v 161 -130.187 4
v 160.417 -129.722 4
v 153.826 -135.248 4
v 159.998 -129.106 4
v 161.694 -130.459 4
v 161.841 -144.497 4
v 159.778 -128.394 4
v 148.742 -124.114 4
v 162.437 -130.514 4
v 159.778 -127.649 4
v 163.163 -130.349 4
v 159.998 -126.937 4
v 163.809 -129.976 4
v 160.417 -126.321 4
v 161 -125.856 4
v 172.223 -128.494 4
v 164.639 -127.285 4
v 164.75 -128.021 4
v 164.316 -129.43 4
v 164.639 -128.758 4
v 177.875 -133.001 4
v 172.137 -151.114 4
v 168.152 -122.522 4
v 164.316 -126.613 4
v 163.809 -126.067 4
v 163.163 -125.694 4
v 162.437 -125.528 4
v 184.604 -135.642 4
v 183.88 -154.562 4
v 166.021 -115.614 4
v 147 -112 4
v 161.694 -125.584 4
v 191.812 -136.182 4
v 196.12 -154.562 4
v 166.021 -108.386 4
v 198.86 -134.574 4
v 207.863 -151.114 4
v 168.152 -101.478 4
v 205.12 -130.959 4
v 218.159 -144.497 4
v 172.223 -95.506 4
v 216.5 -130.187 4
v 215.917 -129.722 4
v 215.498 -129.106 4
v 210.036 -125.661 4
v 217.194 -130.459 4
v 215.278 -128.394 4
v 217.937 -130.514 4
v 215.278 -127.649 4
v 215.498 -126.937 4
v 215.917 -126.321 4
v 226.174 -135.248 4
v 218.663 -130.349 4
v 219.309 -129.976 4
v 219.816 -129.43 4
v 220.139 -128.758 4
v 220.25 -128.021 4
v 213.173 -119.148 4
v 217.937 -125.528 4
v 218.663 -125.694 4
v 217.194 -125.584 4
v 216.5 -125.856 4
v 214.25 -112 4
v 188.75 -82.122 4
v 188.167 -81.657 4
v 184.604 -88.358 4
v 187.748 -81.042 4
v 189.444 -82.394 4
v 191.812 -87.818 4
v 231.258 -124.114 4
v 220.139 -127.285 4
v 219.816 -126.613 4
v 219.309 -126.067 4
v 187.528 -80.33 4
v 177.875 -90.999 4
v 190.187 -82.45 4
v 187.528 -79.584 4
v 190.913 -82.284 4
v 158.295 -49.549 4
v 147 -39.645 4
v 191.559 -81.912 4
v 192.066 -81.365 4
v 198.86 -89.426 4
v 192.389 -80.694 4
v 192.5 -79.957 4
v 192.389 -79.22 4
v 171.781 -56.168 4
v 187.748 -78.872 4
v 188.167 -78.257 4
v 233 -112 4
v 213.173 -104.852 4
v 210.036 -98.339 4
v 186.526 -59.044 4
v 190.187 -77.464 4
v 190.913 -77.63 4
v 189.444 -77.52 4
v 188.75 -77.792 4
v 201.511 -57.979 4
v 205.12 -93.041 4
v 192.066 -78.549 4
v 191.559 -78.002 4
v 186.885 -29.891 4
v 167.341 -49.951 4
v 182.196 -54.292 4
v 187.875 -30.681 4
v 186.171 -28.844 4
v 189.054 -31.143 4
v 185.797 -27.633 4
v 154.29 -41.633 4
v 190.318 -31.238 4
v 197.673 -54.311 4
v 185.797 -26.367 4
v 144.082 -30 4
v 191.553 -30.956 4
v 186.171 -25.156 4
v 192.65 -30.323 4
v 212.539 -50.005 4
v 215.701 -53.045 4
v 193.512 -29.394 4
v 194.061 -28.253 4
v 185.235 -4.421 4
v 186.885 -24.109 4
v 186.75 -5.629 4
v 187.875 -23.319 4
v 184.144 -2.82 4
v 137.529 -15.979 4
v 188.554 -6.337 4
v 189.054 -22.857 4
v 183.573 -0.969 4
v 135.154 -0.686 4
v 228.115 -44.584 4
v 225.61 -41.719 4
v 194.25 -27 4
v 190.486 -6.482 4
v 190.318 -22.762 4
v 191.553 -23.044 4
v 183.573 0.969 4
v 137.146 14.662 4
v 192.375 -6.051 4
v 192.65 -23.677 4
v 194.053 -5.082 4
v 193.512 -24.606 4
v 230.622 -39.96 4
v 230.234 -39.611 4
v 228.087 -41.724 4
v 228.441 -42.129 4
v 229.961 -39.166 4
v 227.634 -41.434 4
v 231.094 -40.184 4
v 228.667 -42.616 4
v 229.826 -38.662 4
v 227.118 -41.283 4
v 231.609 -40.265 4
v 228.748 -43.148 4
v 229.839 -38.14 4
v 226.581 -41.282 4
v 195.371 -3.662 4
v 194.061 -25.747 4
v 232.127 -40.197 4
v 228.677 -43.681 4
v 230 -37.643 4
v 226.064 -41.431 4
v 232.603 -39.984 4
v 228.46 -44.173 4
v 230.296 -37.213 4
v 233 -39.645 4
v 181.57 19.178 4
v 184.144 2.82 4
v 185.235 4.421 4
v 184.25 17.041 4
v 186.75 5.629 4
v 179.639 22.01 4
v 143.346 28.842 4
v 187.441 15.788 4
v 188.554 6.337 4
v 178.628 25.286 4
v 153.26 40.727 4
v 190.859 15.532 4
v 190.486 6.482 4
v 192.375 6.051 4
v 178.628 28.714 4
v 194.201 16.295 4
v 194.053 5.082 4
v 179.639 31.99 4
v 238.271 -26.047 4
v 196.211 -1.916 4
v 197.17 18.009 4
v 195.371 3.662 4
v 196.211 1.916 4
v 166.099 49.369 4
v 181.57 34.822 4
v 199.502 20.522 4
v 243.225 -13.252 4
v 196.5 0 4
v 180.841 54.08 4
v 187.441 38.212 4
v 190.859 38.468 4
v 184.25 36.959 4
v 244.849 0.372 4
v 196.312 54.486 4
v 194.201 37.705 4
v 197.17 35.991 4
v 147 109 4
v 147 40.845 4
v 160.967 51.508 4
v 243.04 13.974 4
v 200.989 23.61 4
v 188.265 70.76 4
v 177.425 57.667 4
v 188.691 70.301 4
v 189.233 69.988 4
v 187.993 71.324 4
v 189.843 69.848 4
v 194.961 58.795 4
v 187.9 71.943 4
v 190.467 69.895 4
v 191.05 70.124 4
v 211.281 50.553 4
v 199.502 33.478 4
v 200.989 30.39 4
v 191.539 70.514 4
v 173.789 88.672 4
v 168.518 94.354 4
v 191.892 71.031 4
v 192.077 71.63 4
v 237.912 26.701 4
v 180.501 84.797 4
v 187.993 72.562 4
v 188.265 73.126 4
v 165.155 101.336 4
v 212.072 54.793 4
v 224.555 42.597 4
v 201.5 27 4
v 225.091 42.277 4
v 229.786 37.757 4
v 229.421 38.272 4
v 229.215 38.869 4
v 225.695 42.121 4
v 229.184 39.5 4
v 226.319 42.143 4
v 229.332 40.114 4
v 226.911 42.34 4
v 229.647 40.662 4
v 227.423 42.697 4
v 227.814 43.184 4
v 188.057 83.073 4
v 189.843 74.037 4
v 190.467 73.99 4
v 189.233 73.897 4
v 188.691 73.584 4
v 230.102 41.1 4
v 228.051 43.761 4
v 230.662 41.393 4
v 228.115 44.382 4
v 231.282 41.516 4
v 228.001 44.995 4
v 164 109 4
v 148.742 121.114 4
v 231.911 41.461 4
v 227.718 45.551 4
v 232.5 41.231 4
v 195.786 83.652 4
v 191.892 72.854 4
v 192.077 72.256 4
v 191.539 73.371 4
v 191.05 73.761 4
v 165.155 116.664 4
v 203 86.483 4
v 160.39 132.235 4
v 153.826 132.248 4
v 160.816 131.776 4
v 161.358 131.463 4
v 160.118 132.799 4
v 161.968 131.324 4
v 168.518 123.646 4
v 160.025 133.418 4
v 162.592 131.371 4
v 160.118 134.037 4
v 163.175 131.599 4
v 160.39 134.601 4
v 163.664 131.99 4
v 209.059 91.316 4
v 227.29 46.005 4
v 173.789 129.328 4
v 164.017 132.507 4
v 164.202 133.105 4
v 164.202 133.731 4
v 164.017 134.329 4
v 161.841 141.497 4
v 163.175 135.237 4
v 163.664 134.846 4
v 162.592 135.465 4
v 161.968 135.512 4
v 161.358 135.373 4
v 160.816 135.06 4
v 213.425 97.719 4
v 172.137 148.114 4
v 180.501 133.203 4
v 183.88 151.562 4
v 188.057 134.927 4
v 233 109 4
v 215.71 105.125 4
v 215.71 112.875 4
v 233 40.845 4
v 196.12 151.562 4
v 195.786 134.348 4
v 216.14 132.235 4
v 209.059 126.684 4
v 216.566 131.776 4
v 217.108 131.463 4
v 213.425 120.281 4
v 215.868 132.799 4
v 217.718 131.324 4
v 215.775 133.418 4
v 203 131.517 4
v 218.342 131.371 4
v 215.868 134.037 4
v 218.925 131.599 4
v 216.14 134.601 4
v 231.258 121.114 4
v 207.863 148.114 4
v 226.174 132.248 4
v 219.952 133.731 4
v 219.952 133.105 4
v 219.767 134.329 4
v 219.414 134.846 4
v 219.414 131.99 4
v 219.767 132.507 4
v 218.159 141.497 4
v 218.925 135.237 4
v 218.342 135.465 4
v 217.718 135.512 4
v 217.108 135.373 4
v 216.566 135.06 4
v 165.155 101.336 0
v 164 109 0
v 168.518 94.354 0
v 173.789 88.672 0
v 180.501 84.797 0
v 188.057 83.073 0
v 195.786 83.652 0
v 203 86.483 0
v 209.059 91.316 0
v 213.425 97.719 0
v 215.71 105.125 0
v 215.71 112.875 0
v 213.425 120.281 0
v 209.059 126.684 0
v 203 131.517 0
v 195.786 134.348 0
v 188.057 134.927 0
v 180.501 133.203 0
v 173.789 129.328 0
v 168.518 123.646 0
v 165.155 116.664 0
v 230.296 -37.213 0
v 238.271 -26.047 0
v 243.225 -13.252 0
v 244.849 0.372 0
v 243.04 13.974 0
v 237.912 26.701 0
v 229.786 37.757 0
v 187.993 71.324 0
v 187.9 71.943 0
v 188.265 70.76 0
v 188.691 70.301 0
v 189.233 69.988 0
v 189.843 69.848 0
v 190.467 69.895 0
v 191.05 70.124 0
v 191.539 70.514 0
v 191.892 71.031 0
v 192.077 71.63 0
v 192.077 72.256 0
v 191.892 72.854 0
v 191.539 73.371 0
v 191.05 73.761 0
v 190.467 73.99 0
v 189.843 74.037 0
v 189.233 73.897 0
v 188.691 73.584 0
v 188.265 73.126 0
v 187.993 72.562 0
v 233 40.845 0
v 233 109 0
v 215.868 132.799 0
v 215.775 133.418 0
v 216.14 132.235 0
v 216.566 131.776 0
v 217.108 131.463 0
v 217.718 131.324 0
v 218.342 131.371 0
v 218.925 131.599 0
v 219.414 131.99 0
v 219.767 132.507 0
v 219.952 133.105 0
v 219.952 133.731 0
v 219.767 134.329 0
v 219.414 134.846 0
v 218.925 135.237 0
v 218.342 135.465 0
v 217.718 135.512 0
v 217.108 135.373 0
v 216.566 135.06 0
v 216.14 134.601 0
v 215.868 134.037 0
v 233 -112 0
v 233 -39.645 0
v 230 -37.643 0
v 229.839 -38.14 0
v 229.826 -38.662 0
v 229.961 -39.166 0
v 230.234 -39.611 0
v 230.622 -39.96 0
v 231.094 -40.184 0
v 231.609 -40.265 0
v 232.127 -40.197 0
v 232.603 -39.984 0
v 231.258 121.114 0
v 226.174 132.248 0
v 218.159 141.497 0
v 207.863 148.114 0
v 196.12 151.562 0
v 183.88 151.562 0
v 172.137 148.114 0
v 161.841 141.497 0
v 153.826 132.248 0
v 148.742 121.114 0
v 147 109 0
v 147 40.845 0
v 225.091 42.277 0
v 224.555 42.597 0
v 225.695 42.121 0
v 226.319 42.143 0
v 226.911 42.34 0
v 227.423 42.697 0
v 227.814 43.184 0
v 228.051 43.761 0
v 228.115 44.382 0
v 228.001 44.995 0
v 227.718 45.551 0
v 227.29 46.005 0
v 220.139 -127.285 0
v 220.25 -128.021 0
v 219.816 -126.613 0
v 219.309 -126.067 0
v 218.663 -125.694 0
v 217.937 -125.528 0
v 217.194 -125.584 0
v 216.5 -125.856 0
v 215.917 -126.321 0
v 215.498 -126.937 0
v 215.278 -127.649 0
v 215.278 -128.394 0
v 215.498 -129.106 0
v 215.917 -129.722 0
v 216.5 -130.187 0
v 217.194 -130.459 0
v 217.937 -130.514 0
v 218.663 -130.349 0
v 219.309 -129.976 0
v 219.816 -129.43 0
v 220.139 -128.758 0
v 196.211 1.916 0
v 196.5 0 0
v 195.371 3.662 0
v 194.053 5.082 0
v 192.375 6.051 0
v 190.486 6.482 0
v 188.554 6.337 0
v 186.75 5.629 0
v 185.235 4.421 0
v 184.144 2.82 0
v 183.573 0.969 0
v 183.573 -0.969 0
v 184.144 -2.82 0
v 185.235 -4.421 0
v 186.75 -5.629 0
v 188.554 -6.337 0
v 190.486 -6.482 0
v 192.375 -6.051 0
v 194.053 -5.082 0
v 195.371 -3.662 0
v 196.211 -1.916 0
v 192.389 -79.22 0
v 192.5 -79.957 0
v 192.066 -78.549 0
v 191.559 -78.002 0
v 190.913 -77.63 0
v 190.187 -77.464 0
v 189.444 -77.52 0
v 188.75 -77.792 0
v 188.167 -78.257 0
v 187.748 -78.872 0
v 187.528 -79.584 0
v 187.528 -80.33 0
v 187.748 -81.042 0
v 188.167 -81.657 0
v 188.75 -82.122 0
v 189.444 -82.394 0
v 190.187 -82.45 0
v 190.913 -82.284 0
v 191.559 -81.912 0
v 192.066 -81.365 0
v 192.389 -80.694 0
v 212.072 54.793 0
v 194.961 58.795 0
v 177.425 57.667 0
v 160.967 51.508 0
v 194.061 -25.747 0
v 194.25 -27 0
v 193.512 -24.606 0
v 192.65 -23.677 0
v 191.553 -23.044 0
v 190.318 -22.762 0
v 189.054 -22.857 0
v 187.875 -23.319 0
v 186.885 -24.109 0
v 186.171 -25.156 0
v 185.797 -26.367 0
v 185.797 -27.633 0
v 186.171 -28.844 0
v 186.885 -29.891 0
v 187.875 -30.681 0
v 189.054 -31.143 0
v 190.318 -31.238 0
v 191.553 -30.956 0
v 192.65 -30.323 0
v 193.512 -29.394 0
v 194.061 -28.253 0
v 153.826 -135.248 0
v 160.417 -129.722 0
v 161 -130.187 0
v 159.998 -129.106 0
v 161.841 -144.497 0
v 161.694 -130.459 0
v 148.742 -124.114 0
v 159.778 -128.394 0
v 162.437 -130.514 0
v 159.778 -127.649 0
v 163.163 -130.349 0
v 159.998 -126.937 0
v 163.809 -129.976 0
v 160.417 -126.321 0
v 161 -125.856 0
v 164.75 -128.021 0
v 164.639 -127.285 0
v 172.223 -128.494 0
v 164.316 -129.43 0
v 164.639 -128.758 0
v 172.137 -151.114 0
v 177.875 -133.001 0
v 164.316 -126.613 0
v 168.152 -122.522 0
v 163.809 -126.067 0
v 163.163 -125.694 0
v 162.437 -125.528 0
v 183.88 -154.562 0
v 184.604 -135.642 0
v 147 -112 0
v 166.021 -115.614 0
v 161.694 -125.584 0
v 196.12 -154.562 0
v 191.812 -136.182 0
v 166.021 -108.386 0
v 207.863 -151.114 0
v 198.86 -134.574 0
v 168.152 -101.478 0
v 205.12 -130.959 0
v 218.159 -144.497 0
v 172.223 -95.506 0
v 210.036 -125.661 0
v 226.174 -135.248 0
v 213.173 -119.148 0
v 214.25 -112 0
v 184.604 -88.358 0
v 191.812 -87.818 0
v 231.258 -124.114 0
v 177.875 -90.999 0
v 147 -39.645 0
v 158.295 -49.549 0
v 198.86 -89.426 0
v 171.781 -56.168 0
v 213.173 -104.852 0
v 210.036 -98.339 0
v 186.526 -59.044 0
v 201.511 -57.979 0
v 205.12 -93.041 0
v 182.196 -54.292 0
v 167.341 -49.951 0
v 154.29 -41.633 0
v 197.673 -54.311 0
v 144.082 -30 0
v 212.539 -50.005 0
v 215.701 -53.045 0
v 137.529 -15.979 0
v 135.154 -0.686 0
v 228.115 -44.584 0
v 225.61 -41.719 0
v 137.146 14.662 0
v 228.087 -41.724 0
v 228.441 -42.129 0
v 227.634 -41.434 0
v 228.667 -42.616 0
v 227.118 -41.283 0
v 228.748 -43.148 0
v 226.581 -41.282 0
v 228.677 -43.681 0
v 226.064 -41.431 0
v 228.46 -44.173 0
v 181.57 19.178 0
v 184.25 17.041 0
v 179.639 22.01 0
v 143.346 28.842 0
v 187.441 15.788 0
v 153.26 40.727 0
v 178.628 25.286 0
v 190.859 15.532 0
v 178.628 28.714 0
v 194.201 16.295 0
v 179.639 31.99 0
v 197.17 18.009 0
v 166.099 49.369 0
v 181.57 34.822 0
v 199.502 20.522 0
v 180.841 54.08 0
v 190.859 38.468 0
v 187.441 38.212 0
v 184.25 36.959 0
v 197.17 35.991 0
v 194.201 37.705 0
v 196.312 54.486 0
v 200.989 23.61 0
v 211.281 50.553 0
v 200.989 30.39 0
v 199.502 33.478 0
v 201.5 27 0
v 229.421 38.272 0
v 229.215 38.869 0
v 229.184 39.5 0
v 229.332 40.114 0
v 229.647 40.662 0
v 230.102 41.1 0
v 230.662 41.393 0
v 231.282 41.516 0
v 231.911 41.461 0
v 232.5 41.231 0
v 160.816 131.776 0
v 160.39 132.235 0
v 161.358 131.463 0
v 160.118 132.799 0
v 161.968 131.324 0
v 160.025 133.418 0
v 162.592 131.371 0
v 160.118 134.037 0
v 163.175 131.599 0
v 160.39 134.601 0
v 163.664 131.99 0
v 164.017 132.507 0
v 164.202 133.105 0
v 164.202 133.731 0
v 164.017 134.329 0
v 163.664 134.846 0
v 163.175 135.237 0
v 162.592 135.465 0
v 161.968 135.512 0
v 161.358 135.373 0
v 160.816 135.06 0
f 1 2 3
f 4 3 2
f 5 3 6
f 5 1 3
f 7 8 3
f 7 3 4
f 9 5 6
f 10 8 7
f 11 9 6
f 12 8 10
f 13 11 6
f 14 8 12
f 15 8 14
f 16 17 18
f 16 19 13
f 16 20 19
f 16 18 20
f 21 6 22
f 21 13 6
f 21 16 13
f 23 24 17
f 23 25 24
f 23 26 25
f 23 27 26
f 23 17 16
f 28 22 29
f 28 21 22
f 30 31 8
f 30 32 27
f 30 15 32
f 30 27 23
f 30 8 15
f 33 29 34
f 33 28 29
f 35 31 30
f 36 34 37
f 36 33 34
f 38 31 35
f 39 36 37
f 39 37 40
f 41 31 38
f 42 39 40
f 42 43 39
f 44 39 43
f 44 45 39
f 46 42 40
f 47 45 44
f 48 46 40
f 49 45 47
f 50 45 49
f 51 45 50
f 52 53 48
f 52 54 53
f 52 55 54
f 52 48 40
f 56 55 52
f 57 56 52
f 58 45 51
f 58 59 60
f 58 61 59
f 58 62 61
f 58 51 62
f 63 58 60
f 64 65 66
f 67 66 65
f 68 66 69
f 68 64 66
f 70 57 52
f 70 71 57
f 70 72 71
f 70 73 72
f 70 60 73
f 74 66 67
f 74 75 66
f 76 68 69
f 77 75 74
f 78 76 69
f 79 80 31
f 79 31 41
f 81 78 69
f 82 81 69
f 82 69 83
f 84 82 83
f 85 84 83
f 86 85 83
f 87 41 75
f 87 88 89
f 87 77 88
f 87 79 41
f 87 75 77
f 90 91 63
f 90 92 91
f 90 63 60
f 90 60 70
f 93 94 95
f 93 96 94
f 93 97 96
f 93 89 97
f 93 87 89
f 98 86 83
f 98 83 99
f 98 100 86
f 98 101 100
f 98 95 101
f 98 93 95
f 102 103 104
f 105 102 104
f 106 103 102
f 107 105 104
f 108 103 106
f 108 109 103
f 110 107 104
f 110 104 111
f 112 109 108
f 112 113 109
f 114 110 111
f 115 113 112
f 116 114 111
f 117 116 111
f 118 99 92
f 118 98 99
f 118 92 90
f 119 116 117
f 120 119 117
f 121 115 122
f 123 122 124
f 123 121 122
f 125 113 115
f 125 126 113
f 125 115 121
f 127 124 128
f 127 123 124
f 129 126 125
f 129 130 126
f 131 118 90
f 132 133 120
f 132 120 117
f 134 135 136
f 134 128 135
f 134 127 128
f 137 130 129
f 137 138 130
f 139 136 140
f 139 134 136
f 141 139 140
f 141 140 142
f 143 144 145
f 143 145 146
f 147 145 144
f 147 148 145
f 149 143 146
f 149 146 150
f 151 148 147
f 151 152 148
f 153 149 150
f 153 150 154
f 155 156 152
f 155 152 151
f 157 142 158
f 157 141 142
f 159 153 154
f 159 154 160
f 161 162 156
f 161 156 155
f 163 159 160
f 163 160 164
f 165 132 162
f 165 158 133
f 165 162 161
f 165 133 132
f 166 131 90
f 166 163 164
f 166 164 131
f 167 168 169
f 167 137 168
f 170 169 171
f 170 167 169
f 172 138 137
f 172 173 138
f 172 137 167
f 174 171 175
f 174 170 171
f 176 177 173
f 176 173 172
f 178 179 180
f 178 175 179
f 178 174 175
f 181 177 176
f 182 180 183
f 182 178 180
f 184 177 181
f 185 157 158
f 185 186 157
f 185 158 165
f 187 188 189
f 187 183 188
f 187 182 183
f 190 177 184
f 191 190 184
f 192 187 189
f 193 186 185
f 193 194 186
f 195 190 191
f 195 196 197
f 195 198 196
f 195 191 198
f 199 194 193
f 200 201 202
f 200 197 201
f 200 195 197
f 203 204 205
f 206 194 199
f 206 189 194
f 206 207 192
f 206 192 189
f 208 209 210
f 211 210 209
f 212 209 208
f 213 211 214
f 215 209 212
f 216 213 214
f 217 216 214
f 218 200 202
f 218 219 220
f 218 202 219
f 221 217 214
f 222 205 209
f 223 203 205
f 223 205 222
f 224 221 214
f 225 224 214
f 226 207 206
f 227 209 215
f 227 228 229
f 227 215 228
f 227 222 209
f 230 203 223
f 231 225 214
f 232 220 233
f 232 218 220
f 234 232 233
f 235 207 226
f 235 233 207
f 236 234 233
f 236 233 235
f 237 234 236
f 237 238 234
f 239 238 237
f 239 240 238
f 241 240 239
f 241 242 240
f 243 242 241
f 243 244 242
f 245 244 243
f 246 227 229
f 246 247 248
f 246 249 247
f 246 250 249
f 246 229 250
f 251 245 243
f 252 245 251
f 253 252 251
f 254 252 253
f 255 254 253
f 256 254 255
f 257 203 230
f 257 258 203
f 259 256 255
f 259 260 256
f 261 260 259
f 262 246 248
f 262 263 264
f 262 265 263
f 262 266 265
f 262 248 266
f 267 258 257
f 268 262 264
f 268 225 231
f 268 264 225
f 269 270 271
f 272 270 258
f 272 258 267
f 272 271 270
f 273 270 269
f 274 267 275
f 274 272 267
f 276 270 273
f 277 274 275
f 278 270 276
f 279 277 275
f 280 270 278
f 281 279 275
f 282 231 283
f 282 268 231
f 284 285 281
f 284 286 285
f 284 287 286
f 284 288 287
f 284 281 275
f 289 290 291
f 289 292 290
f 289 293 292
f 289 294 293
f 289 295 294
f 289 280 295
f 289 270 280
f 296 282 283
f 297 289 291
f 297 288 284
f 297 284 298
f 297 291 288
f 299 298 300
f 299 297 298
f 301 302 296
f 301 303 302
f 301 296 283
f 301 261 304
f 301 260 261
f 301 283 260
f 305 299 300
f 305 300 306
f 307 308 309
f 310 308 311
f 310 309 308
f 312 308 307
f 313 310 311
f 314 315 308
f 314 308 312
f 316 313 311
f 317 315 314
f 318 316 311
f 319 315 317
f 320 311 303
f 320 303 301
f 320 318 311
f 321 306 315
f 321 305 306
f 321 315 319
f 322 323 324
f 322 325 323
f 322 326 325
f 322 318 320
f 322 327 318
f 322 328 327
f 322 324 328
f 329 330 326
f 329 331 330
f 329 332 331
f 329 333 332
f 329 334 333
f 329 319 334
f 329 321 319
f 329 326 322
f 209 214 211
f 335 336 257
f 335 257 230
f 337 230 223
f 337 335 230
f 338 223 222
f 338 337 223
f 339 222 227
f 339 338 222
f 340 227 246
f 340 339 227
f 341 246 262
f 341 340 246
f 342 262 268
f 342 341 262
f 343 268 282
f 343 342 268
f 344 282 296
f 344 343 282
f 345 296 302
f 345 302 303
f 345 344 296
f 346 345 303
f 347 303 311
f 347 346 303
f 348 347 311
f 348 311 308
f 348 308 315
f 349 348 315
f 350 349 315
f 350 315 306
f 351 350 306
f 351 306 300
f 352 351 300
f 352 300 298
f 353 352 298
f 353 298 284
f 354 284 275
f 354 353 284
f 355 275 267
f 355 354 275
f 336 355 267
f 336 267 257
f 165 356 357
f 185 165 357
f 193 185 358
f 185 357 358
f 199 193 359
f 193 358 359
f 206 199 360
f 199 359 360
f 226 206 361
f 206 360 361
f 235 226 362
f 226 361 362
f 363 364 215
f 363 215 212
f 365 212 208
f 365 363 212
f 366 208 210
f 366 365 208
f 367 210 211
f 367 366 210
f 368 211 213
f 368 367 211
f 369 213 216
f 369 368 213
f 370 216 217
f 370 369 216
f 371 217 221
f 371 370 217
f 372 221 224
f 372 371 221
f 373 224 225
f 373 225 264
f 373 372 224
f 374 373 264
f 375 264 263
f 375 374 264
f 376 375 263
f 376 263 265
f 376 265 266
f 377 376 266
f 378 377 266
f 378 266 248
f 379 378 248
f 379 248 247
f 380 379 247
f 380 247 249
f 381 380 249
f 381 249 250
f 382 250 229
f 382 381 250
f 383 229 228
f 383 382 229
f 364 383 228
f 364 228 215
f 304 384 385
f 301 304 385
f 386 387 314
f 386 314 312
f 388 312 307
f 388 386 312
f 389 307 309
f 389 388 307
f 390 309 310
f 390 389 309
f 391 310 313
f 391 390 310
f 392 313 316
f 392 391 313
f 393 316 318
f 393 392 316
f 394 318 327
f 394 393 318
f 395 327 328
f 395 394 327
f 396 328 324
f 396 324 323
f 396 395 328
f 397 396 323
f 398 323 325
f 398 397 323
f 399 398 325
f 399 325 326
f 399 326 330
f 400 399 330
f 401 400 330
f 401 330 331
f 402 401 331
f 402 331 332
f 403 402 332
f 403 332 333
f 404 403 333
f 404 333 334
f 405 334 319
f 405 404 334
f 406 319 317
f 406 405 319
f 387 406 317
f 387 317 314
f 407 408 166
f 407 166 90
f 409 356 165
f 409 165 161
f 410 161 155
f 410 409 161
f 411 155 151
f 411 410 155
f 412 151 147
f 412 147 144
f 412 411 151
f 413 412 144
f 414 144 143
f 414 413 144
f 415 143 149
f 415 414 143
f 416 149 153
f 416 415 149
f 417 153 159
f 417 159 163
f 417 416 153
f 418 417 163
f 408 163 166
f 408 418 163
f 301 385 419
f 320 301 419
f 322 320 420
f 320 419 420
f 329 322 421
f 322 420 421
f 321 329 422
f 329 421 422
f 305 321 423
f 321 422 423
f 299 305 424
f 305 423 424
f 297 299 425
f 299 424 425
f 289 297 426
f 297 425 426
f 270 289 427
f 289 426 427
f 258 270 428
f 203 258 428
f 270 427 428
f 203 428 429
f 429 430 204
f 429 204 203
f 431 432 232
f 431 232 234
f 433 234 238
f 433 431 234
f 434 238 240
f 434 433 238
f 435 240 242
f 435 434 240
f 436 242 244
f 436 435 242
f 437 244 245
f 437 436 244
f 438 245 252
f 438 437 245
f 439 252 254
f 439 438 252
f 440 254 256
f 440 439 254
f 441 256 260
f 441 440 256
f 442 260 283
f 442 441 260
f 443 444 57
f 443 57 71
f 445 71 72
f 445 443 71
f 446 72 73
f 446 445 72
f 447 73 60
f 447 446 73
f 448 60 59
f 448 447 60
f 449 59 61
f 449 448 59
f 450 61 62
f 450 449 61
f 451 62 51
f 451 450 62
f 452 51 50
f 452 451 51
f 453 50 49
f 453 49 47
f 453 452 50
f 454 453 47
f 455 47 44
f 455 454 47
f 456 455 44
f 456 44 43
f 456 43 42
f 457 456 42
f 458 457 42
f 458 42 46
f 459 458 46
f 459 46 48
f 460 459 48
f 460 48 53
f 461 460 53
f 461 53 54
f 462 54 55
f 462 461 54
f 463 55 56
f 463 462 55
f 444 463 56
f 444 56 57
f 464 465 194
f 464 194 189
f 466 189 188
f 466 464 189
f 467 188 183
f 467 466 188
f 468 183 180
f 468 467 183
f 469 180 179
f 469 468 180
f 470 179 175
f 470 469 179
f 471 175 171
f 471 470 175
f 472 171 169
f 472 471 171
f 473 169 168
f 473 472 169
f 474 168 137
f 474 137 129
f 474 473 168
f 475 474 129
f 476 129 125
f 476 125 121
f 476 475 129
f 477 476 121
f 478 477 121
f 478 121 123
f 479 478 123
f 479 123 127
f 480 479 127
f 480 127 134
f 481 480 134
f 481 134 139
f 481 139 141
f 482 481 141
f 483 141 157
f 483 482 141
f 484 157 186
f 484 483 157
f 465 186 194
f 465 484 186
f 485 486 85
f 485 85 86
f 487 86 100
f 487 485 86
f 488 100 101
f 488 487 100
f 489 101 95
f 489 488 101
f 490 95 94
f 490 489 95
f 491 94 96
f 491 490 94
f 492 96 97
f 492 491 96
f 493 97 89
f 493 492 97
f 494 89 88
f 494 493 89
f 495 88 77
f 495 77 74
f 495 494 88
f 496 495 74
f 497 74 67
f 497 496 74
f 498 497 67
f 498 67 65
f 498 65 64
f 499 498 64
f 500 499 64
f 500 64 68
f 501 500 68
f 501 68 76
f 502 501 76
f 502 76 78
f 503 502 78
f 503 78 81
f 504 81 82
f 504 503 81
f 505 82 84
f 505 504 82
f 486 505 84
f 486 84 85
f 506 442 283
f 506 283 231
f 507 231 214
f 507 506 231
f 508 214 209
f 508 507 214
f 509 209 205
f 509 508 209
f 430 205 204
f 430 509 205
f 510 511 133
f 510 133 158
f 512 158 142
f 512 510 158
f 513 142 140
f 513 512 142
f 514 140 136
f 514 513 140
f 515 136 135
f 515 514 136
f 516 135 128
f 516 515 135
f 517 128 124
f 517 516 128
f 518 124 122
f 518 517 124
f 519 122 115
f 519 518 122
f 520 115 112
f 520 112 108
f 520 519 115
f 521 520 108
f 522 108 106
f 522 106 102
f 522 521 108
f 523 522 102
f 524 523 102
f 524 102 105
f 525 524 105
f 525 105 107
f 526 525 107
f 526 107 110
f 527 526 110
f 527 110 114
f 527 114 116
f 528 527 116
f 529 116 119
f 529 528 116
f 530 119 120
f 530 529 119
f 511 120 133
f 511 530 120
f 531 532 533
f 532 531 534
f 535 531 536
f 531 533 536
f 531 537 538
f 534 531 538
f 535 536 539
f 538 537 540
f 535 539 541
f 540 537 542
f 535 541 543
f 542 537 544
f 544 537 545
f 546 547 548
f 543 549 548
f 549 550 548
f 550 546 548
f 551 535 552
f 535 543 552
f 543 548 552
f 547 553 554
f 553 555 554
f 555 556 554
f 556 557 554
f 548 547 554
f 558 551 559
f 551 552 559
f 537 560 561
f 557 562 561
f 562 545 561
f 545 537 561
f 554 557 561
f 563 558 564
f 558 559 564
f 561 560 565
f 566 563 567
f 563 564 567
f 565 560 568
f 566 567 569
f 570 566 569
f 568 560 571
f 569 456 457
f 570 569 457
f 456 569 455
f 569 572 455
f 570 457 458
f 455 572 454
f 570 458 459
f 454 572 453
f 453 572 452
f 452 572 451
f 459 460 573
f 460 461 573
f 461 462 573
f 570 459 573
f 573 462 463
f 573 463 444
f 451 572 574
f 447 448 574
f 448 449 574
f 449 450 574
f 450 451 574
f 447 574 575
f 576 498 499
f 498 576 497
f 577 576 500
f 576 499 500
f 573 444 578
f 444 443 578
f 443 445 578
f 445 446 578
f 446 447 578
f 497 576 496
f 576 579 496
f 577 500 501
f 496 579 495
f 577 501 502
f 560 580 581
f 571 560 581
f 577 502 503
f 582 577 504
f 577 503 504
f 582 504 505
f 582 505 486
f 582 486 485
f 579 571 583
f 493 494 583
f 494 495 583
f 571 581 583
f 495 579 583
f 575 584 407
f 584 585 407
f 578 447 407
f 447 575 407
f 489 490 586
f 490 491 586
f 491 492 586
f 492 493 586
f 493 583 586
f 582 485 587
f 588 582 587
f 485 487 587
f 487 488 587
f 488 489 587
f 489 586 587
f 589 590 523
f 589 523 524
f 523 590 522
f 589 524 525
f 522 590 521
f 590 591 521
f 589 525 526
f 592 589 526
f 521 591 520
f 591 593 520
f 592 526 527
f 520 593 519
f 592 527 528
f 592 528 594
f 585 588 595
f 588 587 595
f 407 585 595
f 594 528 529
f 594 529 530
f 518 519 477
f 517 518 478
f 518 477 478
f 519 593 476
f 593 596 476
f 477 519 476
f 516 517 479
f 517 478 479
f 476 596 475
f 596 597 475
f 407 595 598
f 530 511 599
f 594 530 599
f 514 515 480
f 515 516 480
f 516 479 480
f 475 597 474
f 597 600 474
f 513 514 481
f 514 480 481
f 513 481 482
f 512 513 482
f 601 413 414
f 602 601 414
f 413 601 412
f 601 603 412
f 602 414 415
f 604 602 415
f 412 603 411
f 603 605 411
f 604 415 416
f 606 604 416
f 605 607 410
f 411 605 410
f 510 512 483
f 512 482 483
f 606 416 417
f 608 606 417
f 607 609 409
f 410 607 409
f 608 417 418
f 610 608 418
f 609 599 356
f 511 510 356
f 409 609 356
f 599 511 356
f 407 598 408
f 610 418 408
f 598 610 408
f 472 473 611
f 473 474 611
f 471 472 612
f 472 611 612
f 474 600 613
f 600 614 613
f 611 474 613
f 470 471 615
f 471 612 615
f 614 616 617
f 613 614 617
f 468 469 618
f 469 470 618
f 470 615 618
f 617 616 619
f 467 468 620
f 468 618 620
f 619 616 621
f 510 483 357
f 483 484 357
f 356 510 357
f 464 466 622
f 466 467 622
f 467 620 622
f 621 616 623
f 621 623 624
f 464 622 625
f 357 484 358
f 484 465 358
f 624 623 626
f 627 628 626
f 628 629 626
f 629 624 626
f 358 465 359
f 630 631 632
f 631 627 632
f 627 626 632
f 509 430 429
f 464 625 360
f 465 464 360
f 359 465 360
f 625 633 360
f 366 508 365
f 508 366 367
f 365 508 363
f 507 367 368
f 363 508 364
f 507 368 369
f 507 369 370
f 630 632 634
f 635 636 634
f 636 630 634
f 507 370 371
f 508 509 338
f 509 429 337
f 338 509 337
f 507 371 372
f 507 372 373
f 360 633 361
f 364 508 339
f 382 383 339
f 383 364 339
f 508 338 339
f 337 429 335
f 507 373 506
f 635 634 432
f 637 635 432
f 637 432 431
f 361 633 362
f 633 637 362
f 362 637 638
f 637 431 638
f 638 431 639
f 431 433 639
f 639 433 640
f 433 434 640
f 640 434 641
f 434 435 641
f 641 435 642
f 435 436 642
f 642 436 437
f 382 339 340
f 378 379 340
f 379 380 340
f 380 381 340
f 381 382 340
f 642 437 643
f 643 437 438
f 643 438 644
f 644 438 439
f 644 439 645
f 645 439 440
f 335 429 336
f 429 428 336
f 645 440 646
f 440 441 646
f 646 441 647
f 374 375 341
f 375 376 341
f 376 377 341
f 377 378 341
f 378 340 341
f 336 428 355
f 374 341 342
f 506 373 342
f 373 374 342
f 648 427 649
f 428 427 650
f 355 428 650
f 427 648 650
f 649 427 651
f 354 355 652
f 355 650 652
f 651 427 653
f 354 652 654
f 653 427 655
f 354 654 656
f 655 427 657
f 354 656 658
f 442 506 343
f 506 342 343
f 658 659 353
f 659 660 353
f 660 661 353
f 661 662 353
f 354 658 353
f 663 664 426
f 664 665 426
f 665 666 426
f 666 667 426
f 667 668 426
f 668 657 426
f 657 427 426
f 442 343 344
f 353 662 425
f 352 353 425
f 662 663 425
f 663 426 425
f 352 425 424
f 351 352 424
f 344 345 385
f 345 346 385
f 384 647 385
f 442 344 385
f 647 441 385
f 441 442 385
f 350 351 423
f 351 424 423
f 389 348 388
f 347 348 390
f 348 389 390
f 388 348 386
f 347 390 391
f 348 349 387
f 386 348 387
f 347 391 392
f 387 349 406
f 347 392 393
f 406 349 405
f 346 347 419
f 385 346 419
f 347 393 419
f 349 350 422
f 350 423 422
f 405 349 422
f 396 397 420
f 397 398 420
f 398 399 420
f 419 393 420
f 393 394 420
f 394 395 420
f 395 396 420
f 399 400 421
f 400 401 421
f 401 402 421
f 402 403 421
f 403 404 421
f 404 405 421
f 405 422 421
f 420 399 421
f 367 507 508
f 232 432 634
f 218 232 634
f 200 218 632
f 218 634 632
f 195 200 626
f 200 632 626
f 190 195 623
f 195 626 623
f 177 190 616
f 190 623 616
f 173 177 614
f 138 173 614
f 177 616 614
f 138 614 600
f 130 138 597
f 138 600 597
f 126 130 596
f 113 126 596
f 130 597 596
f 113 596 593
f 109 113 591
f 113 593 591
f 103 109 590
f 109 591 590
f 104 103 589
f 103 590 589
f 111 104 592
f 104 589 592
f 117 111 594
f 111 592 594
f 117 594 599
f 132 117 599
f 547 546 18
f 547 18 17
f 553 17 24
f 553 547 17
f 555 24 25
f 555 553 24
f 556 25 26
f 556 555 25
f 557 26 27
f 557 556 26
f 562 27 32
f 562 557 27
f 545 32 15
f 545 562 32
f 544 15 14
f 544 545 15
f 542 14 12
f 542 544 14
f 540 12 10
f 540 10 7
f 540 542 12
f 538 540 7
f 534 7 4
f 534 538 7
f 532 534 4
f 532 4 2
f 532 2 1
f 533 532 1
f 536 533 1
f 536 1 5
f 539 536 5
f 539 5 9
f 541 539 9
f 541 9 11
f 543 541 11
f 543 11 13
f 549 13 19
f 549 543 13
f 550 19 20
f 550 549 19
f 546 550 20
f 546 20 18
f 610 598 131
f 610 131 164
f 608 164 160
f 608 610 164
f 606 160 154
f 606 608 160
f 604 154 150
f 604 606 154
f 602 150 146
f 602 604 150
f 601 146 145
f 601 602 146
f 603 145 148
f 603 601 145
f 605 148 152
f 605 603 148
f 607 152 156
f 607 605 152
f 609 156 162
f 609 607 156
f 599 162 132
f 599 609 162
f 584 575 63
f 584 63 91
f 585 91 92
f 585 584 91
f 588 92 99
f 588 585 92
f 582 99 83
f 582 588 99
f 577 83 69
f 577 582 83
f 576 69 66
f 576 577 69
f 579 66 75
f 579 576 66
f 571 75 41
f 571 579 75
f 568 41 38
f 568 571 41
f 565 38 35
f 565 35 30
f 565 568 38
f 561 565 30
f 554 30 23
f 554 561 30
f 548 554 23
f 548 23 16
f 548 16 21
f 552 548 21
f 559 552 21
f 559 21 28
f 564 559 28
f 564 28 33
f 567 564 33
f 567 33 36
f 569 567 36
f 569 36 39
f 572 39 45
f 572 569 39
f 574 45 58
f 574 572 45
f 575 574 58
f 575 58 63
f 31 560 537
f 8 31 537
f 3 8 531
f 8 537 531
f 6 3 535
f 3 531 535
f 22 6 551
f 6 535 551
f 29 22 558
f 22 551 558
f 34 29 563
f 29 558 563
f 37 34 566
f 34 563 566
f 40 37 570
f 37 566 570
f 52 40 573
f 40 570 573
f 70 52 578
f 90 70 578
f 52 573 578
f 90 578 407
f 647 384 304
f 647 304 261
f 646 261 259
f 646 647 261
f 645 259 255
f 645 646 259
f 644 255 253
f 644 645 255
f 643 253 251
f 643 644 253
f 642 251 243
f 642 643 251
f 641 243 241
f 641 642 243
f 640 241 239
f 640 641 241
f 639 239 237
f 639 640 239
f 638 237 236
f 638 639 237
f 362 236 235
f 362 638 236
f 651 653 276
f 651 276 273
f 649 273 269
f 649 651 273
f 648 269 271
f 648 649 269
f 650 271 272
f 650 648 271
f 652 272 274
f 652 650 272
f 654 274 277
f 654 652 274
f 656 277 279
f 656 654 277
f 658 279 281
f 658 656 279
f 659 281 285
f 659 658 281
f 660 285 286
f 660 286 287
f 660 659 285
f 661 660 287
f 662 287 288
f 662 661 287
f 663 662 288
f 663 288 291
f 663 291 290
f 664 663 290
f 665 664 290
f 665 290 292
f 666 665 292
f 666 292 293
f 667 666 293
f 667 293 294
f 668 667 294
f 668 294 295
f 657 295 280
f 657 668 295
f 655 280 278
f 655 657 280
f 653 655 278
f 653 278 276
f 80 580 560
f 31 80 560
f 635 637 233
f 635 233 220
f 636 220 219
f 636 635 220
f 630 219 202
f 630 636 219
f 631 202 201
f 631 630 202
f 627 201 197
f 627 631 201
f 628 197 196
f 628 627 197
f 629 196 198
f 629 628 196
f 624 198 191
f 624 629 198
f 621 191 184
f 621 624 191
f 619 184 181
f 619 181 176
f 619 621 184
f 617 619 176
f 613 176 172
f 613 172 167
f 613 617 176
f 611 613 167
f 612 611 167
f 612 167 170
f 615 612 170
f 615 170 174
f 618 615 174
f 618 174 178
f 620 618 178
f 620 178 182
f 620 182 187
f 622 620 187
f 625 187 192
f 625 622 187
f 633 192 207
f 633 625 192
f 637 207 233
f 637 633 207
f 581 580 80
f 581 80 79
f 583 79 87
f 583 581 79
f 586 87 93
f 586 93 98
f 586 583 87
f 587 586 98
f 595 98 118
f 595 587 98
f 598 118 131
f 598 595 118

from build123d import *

# Parameters (mm, degrees)
SKETCH003_R                = 54.85
SKETCH003_R_2              = 11.5
SKETCH003_R_3              = 6.5
SKETCH003_R_4              = 4.25
EXTRUDE010_DEPTH           = 4
EXTRUDE011_DEPTH           = 4
SKETCH_R                   = 24.25
SKETCH_R_2                 = 2.5
EXTRUDE008_DEPTH           = 4
SKETCH001_R                = 26
SKETCH001_R_2              = 2.1
EXTRUDE007_DEPTH           = 4
EXTRUDE007_PLACEMENT_ANGLE = 180


with BuildPart() as cap001:
    # Sketch003 (on Face2 of Tube) → Extrude010 (new body)
    with BuildSketch(Plane.XY.offset(150)):
        Circle(SKETCH003_R)
        with Locations((0, 27)):
            Circle(SKETCH003_R_2, mode=Mode.SUBTRACT)
        Circle(SKETCH003_R_3, mode=Mode.SUBTRACT)
        with Locations((0, -27)):
            Circle(SKETCH003_R_4, mode=Mode.SUBTRACT)
    extrude(amount=EXTRUDE010_DEPTH)


with BuildPart() as cap001_1:
    # Extrude010 placement: moved
    add(cap001.part.moved(Location((190, 0, -150))))


with BuildPart() as fusion:
    # Sketch005 → Extrude011 (new body)
    with BuildSketch(Plane.XY):
        with BuildLine():
            ThreePointArc((233, 40.844952), (229.858715, 40.897579), (229.786368, 37.756687))
            ThreePointArc((229.786368, 37.756687), (227.249454, 40.261653), (224.555163, 42.596517))
            ThreePointArc((224.555163, 42.596517), (227.636022, 42.926115), (227.289643, 46.005133))
            ThreePointArc((233, 40.844952), (230.227647, 43.516698), (227.289643, 46.005133))
        make_face()
        with BuildLine():
            ThreePointArc((230.295506, -37.21283), (230.41557, -39.799082), (233, -39.644688))
            ThreePointArc((228.114531, -44.584093), (230.632391, -42.188696), (233, -39.644688))
            ThreePointArc((228.114531, -44.584093), (228.278175, -41.913762), (225.609951, -41.718748))
            ThreePointArc((225.609951, -41.718748), (228.01954, -39.535264), (230.295506, -37.21283))
        make_face()
    extrude(amount=EXTRUDE011_DEPTH)

    # Fusion: union Cap001
    add(cap001_1.part)


with BuildPart() as fusion001:
    # Sketch → Extrude008 (new body)
    with BuildSketch(Plane.XY):
        with BuildLine():
            ThreePointArc((-43, -37.644688), (0, -57.15), (43, -37.644688))
            Line((43, -37.644688), (43, -110))
            ThreePointArc((-43, -110), (0, -153), (43, -110))
            Line((-43, -37.644688), (-43, -110))
        make_face()
        with Locations((0, -110)):
            Circle(SKETCH_R, mode=Mode.SUBTRACT)
        with Locations((0, -77.95706)):
            Circle(SKETCH_R_2, mode=Mode.SUBTRACT)
        with Locations((-27.75, -126.02147)):
            Circle(SKETCH_R_2, mode=Mode.SUBTRACT)
        with Locations((27.75, -126.02147)):
            Circle(SKETCH_R_2, mode=Mode.SUBTRACT)
    extrude(amount=EXTRUDE008_DEPTH)


with BuildPart() as fusion001_1:
    # Extrude008 placement: moved
    add(fusion001.part.moved(Location((190, -2, 0))))

    # Fusion001: union Fusion
    add(fusion.part)


with BuildPart() as fusion002:
    # Sketch001 → Extrude007 (new body)
    with BuildSketch(Plane.XY):
        with BuildLine():
            ThreePointArc((-43, -41.844952), (0, -60), (43, -41.844952))
            Line((43, -41.844952), (43, -110))
            ThreePointArc((-43, -110), (0, -153), (43, -110))
            Line((-43, -41.844952), (-43, -110))
        make_face()
        with Locations((0, -110)):
            Circle(SKETCH001_R, mode=Mode.SUBTRACT)
        with Locations((0, -72.942541)):
            Circle(SKETCH001_R_2, mode=Mode.SUBTRACT)
        with Locations((27.875, -134.418019)):
            Circle(SKETCH001_R_2, mode=Mode.SUBTRACT)
        with Locations((-27.875, -134.418019)):
            Circle(SKETCH001_R_2, mode=Mode.SUBTRACT)
    extrude(amount=EXTRUDE007_DEPTH)


with BuildPart() as fusion002_1:
    # Extrude007 placement: moved
    add(fusion002.part.moved(Location((190, -1, 0))).rotate(Axis((190, -1, 0), (0, 0, 1)), EXTRUDE007_PLACEMENT_ANGLE))

    # Fusion002: union Fusion001
    add(fusion001_1.part)


solid = fusion002_1.part
